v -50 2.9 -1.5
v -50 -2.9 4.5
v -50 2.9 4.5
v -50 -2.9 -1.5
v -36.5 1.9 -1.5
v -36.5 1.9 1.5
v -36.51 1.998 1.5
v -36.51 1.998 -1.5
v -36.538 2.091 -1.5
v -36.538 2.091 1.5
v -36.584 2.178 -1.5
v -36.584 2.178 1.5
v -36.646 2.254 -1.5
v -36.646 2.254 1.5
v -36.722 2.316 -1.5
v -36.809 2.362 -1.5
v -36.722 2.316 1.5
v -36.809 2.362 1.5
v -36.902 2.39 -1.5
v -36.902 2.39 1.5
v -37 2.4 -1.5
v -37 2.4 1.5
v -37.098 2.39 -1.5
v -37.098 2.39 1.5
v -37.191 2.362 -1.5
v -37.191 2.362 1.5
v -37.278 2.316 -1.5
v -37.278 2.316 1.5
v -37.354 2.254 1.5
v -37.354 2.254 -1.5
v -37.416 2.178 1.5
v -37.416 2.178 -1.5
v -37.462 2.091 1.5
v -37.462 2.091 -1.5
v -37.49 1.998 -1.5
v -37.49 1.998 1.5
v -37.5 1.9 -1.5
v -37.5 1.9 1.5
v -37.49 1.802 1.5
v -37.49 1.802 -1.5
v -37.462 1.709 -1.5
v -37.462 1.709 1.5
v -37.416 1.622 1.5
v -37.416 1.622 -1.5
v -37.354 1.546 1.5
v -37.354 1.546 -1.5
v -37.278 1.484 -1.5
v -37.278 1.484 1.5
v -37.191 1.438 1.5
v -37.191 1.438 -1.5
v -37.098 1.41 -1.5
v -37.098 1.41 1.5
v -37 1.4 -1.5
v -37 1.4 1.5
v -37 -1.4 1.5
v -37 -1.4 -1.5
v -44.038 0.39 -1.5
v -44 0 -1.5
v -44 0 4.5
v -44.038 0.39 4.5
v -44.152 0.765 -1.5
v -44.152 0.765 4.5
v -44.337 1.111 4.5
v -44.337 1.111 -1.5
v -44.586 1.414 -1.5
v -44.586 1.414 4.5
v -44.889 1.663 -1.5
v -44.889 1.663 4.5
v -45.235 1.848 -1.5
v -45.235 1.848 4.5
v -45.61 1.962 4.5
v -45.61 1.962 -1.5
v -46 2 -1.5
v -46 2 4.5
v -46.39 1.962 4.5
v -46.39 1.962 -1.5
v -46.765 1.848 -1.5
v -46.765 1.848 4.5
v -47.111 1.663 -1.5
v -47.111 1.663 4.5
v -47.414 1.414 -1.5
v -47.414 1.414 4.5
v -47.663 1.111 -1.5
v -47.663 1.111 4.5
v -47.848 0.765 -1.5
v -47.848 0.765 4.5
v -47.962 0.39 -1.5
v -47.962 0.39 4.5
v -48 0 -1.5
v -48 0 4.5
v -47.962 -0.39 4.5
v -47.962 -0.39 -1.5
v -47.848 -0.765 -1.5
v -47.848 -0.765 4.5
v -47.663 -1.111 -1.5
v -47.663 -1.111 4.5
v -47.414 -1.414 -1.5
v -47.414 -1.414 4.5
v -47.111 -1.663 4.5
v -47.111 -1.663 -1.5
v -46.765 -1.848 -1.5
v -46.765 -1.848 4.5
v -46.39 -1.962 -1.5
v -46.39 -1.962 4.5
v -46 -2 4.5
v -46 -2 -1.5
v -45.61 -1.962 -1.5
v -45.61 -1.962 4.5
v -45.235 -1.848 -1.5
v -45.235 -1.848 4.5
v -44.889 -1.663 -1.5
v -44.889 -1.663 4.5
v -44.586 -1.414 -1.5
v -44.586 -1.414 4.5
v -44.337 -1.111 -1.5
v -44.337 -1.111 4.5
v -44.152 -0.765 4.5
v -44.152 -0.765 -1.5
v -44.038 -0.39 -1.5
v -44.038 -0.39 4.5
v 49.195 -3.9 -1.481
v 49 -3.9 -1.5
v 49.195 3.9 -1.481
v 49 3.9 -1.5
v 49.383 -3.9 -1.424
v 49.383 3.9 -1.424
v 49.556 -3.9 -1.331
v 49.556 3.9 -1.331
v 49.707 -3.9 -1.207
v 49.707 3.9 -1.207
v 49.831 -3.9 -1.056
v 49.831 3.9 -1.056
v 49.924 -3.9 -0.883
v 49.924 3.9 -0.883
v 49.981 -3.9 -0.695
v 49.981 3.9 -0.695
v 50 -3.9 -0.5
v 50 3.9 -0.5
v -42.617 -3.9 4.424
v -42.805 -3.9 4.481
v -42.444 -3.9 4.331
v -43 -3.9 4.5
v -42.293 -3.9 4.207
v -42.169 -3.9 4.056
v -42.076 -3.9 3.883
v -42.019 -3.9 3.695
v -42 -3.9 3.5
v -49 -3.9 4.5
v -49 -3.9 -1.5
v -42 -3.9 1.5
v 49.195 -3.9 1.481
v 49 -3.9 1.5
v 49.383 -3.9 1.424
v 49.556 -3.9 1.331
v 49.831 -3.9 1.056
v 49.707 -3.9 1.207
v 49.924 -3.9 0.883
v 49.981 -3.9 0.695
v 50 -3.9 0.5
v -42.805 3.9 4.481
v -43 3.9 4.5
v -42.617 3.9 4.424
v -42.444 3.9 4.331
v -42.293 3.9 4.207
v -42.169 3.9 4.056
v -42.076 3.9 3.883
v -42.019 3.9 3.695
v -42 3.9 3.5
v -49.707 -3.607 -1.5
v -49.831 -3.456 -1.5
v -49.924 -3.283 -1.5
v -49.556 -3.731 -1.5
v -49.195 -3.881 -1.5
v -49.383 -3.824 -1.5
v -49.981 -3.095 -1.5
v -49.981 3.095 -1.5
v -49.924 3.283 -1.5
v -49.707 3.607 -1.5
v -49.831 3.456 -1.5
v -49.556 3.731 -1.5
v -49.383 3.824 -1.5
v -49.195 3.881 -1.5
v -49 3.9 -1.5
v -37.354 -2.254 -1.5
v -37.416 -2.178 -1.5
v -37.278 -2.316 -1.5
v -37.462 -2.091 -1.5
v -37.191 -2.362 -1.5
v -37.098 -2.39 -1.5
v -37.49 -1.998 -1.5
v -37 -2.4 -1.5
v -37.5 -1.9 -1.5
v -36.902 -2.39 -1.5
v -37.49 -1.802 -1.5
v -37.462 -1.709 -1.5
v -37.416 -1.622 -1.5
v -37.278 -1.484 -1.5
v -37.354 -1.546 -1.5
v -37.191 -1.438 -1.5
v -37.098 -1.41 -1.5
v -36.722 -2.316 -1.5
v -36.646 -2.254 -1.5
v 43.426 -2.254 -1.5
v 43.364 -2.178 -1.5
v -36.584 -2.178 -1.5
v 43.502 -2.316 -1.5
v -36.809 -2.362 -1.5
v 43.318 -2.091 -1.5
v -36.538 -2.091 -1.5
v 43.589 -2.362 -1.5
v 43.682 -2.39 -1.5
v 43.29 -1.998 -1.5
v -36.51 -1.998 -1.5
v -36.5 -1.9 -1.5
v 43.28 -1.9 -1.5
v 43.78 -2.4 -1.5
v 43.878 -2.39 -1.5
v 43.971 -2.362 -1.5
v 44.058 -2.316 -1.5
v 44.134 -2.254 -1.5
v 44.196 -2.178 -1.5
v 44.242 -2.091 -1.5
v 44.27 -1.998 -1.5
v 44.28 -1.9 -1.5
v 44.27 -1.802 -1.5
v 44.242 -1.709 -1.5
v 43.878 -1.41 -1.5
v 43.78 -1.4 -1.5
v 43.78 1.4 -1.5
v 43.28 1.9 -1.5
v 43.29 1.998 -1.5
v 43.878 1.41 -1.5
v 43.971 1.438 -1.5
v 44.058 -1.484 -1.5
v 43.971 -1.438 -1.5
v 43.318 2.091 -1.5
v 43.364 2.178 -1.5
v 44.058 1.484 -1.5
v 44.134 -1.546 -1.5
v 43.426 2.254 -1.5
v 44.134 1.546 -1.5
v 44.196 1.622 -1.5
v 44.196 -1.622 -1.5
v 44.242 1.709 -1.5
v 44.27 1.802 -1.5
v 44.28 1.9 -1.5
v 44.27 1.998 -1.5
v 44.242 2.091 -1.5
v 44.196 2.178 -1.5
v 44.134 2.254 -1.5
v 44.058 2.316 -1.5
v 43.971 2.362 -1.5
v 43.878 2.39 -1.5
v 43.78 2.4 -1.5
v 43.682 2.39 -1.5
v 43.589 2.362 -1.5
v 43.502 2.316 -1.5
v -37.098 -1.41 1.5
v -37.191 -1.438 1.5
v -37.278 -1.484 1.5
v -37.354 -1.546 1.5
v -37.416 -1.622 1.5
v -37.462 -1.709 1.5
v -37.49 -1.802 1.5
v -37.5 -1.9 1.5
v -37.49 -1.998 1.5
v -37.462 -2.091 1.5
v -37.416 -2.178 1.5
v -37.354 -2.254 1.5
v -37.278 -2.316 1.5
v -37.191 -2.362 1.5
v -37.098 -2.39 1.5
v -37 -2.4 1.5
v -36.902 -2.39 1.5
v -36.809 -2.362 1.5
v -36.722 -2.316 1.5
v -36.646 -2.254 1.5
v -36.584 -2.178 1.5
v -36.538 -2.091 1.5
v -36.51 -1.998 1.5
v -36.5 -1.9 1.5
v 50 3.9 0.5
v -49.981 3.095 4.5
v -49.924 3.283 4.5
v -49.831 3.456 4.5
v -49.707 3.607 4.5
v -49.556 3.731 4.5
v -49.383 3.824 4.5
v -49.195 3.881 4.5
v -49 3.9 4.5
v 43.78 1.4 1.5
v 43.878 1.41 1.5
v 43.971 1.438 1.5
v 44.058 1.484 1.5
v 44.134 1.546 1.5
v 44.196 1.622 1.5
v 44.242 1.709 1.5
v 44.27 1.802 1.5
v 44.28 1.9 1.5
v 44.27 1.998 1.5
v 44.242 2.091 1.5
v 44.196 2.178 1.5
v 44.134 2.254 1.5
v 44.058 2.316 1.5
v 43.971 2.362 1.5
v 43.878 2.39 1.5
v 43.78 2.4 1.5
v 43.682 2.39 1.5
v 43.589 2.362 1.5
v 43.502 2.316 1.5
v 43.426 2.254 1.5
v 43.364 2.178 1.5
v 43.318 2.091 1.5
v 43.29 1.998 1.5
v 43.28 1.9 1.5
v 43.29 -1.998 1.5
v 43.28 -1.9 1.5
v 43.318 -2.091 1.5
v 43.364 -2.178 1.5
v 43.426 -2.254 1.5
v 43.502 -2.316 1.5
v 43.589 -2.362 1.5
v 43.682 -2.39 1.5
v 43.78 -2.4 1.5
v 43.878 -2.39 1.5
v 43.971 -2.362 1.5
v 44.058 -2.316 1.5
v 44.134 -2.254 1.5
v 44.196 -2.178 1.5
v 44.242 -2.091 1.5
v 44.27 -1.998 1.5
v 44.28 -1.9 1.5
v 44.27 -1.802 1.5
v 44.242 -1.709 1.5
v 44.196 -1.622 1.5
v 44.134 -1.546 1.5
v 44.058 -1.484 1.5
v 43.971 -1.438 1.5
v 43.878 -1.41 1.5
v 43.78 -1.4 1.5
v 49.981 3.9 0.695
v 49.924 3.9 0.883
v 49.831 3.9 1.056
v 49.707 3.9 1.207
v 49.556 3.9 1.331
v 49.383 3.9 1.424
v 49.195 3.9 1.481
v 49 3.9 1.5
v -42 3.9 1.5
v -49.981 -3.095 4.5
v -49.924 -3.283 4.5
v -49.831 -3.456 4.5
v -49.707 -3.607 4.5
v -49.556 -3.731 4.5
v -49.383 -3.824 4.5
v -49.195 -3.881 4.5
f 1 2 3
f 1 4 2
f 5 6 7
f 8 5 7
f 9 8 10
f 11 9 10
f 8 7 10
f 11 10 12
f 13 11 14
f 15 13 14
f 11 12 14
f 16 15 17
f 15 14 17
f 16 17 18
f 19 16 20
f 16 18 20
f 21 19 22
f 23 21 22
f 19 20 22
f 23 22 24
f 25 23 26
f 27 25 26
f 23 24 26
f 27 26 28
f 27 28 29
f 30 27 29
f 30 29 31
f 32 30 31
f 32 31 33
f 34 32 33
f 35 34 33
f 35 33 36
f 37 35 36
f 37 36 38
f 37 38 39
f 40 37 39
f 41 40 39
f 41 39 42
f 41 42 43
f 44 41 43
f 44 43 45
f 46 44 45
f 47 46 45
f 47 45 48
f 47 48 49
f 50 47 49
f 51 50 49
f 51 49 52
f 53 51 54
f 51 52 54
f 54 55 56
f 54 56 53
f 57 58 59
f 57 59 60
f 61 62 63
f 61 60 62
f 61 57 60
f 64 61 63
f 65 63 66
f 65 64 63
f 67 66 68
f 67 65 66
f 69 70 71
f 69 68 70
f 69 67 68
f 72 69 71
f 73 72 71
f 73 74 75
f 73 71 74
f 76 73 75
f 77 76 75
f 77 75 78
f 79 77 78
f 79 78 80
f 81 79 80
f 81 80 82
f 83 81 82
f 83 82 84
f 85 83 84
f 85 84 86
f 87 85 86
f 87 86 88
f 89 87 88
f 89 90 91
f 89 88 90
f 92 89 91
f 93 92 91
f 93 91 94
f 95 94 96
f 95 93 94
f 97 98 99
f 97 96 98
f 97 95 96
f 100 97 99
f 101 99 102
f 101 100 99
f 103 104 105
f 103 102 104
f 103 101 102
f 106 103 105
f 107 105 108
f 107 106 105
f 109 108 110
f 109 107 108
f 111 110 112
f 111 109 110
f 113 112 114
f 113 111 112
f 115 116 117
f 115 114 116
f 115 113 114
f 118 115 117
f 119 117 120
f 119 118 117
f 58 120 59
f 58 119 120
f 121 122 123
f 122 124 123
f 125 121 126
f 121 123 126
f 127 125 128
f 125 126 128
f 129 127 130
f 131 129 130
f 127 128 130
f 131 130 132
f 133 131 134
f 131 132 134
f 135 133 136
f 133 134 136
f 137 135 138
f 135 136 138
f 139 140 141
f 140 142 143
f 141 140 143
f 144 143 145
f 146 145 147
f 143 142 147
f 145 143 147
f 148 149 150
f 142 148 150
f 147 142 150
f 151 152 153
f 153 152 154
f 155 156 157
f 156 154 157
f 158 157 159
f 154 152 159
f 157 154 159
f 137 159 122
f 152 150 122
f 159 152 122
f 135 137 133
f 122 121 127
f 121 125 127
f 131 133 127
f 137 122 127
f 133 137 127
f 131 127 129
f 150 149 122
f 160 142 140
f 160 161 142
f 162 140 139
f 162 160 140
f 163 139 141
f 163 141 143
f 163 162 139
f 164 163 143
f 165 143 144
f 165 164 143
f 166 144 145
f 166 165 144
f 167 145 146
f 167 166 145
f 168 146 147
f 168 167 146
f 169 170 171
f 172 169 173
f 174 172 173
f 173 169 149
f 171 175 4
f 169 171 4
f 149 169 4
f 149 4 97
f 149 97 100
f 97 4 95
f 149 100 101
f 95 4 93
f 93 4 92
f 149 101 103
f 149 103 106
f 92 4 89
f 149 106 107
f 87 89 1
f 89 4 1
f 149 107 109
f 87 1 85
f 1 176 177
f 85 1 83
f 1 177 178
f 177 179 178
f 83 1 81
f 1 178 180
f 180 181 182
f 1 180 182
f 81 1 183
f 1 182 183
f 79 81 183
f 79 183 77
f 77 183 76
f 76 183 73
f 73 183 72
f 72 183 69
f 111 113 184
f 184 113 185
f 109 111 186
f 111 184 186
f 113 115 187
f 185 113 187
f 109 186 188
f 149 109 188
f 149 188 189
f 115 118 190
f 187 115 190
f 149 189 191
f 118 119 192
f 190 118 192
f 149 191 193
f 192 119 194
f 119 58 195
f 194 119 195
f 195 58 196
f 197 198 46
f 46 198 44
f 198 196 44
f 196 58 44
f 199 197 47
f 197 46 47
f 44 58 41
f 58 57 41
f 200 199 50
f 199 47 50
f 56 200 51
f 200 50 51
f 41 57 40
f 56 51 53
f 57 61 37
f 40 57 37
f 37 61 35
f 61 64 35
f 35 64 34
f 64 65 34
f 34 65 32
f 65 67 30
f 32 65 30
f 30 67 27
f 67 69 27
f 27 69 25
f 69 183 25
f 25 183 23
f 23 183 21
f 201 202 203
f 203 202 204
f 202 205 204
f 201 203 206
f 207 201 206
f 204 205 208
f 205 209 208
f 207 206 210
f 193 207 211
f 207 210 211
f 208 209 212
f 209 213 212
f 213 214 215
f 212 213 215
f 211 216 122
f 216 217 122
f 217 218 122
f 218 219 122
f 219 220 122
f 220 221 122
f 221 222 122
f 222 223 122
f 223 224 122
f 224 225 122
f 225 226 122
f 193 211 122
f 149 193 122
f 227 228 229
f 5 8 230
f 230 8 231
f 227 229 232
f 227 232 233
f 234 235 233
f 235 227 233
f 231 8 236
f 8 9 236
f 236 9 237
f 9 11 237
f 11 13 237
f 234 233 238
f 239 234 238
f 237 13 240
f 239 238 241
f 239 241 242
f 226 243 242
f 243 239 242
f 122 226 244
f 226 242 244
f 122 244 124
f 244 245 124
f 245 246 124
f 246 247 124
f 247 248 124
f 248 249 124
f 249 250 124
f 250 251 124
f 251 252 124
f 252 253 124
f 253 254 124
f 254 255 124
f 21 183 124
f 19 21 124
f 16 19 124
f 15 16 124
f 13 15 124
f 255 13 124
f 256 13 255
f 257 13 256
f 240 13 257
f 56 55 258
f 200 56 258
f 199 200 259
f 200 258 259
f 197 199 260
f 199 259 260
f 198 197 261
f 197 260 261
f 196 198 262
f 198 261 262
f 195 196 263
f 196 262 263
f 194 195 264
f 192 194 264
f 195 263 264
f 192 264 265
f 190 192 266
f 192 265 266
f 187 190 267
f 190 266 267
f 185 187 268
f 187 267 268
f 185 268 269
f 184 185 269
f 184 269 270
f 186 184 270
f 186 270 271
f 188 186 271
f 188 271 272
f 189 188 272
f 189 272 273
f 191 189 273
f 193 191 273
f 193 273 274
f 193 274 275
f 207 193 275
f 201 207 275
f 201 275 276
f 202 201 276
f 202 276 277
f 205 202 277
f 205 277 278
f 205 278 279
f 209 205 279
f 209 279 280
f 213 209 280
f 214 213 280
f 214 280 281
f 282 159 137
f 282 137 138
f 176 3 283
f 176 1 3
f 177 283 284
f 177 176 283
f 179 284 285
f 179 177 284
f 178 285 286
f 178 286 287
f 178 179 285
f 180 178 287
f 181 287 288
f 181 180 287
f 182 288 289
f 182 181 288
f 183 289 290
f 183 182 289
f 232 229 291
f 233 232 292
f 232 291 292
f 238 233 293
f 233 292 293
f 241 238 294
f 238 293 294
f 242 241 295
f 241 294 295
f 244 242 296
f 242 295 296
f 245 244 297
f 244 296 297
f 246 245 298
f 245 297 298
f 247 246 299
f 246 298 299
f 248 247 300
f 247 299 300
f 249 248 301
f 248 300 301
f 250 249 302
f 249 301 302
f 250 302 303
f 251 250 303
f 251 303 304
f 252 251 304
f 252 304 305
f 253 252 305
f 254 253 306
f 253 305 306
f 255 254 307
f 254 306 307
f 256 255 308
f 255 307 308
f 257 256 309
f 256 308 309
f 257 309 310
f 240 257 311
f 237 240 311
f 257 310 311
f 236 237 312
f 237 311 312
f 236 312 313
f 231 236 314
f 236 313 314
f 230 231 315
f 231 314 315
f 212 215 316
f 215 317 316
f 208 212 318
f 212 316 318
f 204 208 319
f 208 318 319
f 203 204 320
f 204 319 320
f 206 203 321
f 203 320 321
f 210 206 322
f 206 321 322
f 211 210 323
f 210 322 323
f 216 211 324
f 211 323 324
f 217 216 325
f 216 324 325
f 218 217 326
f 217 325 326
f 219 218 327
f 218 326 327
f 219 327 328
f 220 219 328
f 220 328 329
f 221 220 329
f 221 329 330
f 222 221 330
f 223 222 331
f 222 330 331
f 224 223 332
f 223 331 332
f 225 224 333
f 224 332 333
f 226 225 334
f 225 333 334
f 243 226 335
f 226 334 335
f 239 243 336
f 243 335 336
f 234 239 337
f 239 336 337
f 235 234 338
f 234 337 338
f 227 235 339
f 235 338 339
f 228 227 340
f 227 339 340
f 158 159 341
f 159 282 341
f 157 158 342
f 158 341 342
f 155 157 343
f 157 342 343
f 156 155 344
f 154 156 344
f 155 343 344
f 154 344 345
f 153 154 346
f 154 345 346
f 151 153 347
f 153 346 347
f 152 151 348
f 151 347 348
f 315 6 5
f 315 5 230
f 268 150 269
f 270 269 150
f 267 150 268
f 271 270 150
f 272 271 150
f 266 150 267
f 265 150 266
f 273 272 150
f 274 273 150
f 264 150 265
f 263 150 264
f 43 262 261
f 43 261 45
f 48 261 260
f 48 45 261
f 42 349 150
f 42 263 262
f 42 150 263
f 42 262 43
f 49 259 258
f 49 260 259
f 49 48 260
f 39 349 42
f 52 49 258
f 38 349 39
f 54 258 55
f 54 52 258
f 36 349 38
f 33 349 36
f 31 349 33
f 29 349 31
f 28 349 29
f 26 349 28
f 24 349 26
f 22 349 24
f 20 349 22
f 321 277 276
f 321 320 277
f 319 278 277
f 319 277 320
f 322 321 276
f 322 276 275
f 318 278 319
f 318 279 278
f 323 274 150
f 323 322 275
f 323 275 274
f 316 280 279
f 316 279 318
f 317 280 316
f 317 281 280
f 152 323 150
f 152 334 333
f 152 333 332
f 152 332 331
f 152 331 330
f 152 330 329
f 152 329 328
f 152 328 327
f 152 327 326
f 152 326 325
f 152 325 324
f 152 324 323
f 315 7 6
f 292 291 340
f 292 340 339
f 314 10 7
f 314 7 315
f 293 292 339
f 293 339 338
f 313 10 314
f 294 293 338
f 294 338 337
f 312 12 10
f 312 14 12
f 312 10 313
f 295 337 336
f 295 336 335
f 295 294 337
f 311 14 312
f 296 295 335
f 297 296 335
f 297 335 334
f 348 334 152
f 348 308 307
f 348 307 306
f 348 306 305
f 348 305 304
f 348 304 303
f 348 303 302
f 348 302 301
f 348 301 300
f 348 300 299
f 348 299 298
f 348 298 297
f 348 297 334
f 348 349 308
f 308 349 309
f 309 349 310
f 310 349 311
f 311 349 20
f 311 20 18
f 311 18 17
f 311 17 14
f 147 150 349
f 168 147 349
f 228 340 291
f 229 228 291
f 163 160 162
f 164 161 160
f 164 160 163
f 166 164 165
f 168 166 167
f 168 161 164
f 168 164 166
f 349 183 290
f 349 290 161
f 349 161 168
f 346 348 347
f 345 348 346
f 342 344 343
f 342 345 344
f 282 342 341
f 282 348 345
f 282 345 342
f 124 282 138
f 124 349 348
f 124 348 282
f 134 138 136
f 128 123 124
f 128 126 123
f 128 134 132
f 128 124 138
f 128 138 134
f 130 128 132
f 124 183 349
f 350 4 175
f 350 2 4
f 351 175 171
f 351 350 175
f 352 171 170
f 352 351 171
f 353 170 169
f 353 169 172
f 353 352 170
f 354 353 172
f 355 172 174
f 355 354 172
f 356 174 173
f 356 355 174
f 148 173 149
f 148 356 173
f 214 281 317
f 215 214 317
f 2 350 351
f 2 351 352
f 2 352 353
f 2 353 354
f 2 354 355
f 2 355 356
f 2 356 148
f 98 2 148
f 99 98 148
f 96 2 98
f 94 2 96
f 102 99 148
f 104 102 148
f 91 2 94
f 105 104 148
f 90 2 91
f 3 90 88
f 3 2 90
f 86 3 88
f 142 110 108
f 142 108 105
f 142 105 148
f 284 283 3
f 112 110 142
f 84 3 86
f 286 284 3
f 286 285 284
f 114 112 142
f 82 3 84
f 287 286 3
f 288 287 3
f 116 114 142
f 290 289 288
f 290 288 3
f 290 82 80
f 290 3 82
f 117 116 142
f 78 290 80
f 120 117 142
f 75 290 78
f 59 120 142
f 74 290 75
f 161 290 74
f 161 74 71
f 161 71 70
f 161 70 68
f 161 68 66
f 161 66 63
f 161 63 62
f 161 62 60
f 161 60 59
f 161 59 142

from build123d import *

# Parameters (mm, degrees)
SKIZZE1_W                            = 100
SKIZZE1_H                            = 7.8
SKIZZE1_W_2                          = 80.78
SKIZZE1_H_2                          = 3.8
AUFSATZ_LINEAR_AUSTRAGEN1_DEPTH      = 1.5
SKIZZE3_W                            = 8
SKIZZE3_H                            = 7.8
AUFSATZ_LINEAR_AUSTRAGEN2_DEPTH      = 3
SCHNITT_LINEAR_AUSTRAGEN4_DEPTH      = 51.509504056
SCHNITT_LINEAR_AUSTRAGEN4_DEPTH_BACK = 51.509504056
SKIZZE5_R                            = 2
VERRUNDUNG1_R                        = 1
VERRUNDUNG2_R                        = 1
VERRUNDUNG3_R                        = 1
VERRUNDUNG4_R                        = 1
VERRUNDUNG5_R                        = 1
LOCHUNGSSKIZZE_R                     = 0.5
RAHMENLOCHUNGEN_DEPTH                = 51.241516697


with BuildPart() as part:
    # Skizze1 → Aufsatz-Linear austragen1 (new, symmetric)
    with BuildSketch(Plane.XY):
        Rectangle(SKIZZE1_W, SKIZZE1_H)
        with Locations((3.39, 0)):
            Rectangle(SKIZZE1_W_2, SKIZZE1_H_2, mode=Mode.SUBTRACT)
    extrude(amount=AUFSATZ_LINEAR_AUSTRAGEN1_DEPTH, both=True)

    # Skizze3 → Aufsatz-Linear austragen2 (add)
    with BuildSketch(Plane.XY.offset(1.5)):
        with Locations((-46, 0)):
            Rectangle(SKIZZE3_W, SKIZZE3_H)
    extrude(amount=AUFSATZ_LINEAR_AUSTRAGEN2_DEPTH)

    # Skizze5 → Schnitt-Linear austragen4 (cut, two sides: drawn at the far end of the back side and taken through both)
    with BuildSketch(Plane.XY.offset(4.5).offset(-SCHNITT_LINEAR_AUSTRAGEN4_DEPTH_BACK)):
        with Locations((-46, 0)):
            Circle(SKIZZE5_R)
    extrude(amount=SCHNITT_LINEAR_AUSTRAGEN4_DEPTH + SCHNITT_LINEAR_AUSTRAGEN4_DEPTH_BACK, mode=Mode.SUBTRACT)

    # Verrundung1
    verrundung1_edges = [part.edges().sort_by_distance(p)[0] for p in [
        (-50, 3.9, 1.5),
    ]]
    fillet(verrundung1_edges, radius=VERRUNDUNG1_R)

    # Verrundung2
    verrundung2_edges = [part.edges().sort_by_distance(p)[0] for p in [
        (-50, -3.9, 1.5),
    ]]
    fillet(verrundung2_edges, radius=VERRUNDUNG2_R)

    # Verrundung3
    verrundung3_edges = [part.edges().sort_by_distance(p)[0] for p in [
        (-42, 0, 4.5),
    ]]
    fillet(verrundung3_edges, radius=VERRUNDUNG3_R)

    # Verrundung4
    verrundung4_edges = [part.edges().sort_by_distance(p)[0] for p in [
        (50, 0, -1.5),
    ]]
    fillet(verrundung4_edges, radius=VERRUNDUNG4_R)

    # Verrundung5
    verrundung5_edges = [part.edges().sort_by_distance(p)[0] for p in [
        (50, 0, 1.5),
    ]]
    fillet(verrundung5_edges, radius=VERRUNDUNG5_R)

    # Lochungsskizze → RahmenLochungen (cut, through all)
    with BuildSketch(Plane.XY.offset(1.5)):
        with Locations((-37, 1.9)):
            Circle(LOCHUNGSSKIZZE_R)
        with Locations((-37, -1.9)):
            Circle(LOCHUNGSSKIZZE_R)
        with Locations((43.78, -1.9)):
            Circle(LOCHUNGSSKIZZE_R)
        with Locations((43.78, 1.9)):
            Circle(LOCHUNGSSKIZZE_R)
    extrude(amount=-RAHMENLOCHUNGEN_DEPTH, mode=Mode.SUBTRACT)


solid = part.part
